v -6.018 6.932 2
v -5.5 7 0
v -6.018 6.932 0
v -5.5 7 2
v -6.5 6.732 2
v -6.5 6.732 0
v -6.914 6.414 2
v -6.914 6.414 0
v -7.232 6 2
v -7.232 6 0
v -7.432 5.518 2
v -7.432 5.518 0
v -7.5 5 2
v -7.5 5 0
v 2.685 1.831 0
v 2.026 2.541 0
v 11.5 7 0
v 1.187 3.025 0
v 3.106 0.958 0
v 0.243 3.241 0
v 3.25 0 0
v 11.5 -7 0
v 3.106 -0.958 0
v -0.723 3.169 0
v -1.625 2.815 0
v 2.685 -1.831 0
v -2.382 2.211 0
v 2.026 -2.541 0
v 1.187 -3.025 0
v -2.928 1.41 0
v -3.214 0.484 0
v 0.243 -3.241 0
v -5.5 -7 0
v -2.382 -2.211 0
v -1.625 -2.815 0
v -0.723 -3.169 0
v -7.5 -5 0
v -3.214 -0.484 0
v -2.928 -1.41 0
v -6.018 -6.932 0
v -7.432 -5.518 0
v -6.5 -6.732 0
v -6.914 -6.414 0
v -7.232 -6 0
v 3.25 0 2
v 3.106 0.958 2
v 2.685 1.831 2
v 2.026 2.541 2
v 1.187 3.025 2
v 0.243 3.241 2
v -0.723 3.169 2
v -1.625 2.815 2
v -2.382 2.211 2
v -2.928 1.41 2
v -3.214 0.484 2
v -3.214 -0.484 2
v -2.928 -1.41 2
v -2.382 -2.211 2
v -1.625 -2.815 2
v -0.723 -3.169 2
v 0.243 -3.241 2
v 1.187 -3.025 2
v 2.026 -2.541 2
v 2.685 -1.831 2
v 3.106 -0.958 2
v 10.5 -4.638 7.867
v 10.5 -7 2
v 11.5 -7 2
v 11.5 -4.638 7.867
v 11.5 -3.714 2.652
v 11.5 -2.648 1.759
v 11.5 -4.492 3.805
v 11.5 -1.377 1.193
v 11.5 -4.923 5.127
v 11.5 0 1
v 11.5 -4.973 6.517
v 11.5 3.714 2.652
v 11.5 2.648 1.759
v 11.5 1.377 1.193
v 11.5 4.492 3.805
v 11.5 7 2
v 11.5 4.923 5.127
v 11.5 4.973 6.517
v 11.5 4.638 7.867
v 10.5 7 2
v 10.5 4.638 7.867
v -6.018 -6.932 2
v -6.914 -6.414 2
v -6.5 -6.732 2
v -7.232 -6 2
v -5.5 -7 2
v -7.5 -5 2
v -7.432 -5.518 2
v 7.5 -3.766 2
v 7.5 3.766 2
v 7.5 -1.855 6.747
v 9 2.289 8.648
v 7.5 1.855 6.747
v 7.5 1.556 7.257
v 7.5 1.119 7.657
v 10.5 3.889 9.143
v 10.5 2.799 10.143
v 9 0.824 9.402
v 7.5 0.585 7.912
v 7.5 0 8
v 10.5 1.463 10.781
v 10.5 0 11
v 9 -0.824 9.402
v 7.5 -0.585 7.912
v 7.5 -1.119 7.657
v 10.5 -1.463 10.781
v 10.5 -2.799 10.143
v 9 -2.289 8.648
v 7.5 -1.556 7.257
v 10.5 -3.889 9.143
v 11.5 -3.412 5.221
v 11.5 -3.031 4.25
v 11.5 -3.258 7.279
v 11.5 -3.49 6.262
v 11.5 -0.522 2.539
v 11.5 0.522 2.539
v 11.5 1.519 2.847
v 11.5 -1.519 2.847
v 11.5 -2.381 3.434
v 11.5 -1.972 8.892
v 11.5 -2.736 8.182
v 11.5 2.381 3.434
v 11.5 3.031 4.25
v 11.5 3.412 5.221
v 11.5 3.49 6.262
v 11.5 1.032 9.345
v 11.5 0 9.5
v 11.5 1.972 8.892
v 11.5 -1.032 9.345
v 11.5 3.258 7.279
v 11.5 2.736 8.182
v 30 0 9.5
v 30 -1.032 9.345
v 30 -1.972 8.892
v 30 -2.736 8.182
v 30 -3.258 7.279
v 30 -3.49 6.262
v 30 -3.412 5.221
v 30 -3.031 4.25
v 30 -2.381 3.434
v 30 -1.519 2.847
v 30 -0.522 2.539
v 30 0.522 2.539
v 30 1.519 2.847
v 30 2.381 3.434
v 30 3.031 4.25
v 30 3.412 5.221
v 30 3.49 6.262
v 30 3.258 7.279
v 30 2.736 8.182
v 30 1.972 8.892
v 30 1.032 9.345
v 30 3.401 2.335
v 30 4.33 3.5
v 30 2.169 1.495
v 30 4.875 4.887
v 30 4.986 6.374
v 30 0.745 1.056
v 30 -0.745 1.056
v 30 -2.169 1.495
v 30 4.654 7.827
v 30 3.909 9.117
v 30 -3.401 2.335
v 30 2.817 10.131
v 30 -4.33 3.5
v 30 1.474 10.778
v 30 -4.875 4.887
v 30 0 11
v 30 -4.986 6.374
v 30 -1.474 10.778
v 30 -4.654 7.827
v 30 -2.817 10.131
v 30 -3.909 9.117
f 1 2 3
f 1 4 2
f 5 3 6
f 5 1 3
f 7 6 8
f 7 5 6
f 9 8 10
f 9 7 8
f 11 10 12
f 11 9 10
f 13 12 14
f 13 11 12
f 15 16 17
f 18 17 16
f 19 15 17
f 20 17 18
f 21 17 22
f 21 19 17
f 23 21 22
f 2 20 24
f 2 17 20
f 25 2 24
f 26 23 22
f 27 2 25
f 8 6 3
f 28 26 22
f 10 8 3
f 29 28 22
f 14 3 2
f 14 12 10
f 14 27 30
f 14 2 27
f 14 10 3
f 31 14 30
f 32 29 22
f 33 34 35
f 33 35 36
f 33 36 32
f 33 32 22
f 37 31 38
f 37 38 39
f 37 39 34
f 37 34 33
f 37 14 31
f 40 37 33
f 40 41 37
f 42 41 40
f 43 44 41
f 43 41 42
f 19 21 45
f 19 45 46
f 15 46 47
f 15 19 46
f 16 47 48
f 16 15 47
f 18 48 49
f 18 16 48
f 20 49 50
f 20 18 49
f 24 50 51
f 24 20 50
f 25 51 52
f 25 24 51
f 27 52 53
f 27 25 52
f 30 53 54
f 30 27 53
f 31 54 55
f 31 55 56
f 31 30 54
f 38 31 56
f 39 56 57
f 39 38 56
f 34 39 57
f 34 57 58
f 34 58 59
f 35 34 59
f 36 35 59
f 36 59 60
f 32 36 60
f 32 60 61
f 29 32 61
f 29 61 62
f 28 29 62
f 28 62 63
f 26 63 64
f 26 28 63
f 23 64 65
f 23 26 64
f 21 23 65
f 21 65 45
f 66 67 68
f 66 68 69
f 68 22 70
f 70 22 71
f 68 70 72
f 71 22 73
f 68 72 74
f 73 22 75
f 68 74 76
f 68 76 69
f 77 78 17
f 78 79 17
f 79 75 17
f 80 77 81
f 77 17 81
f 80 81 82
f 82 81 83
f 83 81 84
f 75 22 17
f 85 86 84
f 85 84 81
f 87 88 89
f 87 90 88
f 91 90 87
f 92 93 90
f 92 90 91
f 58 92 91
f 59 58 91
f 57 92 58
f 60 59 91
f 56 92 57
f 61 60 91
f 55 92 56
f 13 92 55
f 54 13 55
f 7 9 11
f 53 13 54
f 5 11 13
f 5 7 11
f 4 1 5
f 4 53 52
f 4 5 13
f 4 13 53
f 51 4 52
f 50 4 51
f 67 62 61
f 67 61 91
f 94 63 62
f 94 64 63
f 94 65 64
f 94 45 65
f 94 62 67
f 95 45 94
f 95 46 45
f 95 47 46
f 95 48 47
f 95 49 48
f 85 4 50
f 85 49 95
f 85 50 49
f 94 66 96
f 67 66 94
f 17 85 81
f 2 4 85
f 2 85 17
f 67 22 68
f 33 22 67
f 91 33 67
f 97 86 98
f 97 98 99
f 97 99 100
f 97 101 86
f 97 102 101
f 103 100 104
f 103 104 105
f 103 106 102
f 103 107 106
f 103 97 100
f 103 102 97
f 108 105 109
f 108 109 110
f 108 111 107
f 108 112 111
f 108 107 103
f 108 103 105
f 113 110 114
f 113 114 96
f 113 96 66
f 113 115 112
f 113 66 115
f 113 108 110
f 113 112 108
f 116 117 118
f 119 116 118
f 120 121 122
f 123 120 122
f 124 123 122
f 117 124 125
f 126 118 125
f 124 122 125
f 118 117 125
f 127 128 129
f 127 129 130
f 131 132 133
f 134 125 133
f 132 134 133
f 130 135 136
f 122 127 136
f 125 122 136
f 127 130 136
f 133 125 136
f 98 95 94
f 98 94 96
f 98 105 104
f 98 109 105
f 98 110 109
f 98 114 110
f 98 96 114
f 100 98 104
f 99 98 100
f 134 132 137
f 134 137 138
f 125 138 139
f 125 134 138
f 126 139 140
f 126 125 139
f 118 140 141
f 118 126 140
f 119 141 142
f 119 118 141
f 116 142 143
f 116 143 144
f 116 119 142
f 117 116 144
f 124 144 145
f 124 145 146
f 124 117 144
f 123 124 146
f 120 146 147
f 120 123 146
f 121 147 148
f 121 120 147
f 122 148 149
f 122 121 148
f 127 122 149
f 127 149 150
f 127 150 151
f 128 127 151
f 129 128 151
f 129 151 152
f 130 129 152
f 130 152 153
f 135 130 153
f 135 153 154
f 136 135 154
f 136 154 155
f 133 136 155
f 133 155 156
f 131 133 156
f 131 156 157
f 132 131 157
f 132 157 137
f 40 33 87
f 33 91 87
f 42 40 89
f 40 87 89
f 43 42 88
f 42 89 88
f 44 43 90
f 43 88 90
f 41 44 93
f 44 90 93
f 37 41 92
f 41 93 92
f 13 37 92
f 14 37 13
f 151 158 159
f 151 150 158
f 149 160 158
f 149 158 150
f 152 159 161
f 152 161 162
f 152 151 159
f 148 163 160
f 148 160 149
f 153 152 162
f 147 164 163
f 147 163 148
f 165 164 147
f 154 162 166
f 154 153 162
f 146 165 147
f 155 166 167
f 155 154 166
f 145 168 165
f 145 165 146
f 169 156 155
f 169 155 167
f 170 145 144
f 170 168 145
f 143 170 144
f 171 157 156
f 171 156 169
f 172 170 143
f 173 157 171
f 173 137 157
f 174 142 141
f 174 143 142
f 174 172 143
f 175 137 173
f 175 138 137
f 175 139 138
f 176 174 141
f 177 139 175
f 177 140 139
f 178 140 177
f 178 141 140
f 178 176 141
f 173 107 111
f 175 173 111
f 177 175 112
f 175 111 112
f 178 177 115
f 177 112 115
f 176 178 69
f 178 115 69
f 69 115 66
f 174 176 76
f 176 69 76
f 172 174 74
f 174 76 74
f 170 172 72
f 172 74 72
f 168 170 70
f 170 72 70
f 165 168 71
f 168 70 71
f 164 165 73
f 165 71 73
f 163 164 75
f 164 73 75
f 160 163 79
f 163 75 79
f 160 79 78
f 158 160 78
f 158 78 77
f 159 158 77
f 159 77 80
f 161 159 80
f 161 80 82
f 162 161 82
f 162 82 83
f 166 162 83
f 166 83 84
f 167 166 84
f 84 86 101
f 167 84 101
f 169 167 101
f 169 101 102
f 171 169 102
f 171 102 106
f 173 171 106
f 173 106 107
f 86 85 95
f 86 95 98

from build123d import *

# Parameters (mm, degrees)
SKETCH1_W           = 15
SKETCH1_H           = 14
SKETCH1_R           = 3.25
BOSS_EXTRUDE1_DEPTH = 2
SKETCH2_R           = 5
SKETCH2_R_2         = 3.5
BOSS_EXTRUDE2_DEPTH = 22.5
BOSS_EXTRUDE3_DEPTH = 4
CHAMFER1_SIZE       = 3
FILLET1_R           = 2


with BuildPart() as part:
    # Sketch1 → Boss-Extrude1 (new body)
    with BuildSketch(Plane.XY):
        Rectangle(SKETCH1_W, SKETCH1_H)
        Circle(SKETCH1_R, mode=Mode.SUBTRACT)
    extrude(amount=BOSS_EXTRUDE1_DEPTH)



with BuildPart() as body_2:
    # Sketch2 → Boss-Extrude2 (new body)
    with BuildSketch(Plane(origin=(7.5, 0, 0), x_dir=(0, 0, -1), z_dir=(1, 0, 0))):
        with Locations(Location((-6, 0, 0), (0, 0, 180))):
            Circle(SKETCH2_R)
        with Locations(Location((-6, 0, 0), (0, 0, 180))):
            Circle(SKETCH2_R_2, mode=Mode.SUBTRACT)
    extrude(amount=BOSS_EXTRUDE2_DEPTH)


with BuildPart() as part_1:
    add(part.part)

    add(body_2.part)  # Boss-Extrude3 merges body 2
    # Sketch3 → Boss-Extrude3 (add)
    with BuildSketch(Plane(origin=(7.5, 0, 0), x_dir=(0, 0, -1), z_dir=(1, 0, 0))):
        with BuildLine():
            Line((-7.867068249, 4.638324714), (-2, 7))
            Line((-2, 7), (0, 7))
            Line((0, 7), (0, -7))
            Line((0, -7), (-2, -7))
            Line((-2, -7), (-7.867068249, -4.638324714))
            ThreePointArc((-7.867068249, -4.638324714), (-11, 0), (-7.867068249, 4.638324714))
        make_face()
    extrude(amount=BOSS_EXTRUDE3_DEPTH)

    # Chamfer1
    chamfer1_edges = [part_1.edges().sort_by_distance(p)[0] for p in [
        (7.5, -2.798629911, 10.143388785),
        (7.5, -5.819162357, 4.933534125),
        (7.5, 5.819162357, 4.933534125),
    ]]
    chamfer(chamfer1_edges, length=CHAMFER1_SIZE)

    # Fillet1
    fillet1_edges = [part_1.edges().sort_by_distance(p)[0] for p in [
        (-7.5, 7, 1),
        (-7.5, -7, 1),
    ]]
    fillet(fillet1_edges, radius=FILLET1_R)


solid = part_1.part
